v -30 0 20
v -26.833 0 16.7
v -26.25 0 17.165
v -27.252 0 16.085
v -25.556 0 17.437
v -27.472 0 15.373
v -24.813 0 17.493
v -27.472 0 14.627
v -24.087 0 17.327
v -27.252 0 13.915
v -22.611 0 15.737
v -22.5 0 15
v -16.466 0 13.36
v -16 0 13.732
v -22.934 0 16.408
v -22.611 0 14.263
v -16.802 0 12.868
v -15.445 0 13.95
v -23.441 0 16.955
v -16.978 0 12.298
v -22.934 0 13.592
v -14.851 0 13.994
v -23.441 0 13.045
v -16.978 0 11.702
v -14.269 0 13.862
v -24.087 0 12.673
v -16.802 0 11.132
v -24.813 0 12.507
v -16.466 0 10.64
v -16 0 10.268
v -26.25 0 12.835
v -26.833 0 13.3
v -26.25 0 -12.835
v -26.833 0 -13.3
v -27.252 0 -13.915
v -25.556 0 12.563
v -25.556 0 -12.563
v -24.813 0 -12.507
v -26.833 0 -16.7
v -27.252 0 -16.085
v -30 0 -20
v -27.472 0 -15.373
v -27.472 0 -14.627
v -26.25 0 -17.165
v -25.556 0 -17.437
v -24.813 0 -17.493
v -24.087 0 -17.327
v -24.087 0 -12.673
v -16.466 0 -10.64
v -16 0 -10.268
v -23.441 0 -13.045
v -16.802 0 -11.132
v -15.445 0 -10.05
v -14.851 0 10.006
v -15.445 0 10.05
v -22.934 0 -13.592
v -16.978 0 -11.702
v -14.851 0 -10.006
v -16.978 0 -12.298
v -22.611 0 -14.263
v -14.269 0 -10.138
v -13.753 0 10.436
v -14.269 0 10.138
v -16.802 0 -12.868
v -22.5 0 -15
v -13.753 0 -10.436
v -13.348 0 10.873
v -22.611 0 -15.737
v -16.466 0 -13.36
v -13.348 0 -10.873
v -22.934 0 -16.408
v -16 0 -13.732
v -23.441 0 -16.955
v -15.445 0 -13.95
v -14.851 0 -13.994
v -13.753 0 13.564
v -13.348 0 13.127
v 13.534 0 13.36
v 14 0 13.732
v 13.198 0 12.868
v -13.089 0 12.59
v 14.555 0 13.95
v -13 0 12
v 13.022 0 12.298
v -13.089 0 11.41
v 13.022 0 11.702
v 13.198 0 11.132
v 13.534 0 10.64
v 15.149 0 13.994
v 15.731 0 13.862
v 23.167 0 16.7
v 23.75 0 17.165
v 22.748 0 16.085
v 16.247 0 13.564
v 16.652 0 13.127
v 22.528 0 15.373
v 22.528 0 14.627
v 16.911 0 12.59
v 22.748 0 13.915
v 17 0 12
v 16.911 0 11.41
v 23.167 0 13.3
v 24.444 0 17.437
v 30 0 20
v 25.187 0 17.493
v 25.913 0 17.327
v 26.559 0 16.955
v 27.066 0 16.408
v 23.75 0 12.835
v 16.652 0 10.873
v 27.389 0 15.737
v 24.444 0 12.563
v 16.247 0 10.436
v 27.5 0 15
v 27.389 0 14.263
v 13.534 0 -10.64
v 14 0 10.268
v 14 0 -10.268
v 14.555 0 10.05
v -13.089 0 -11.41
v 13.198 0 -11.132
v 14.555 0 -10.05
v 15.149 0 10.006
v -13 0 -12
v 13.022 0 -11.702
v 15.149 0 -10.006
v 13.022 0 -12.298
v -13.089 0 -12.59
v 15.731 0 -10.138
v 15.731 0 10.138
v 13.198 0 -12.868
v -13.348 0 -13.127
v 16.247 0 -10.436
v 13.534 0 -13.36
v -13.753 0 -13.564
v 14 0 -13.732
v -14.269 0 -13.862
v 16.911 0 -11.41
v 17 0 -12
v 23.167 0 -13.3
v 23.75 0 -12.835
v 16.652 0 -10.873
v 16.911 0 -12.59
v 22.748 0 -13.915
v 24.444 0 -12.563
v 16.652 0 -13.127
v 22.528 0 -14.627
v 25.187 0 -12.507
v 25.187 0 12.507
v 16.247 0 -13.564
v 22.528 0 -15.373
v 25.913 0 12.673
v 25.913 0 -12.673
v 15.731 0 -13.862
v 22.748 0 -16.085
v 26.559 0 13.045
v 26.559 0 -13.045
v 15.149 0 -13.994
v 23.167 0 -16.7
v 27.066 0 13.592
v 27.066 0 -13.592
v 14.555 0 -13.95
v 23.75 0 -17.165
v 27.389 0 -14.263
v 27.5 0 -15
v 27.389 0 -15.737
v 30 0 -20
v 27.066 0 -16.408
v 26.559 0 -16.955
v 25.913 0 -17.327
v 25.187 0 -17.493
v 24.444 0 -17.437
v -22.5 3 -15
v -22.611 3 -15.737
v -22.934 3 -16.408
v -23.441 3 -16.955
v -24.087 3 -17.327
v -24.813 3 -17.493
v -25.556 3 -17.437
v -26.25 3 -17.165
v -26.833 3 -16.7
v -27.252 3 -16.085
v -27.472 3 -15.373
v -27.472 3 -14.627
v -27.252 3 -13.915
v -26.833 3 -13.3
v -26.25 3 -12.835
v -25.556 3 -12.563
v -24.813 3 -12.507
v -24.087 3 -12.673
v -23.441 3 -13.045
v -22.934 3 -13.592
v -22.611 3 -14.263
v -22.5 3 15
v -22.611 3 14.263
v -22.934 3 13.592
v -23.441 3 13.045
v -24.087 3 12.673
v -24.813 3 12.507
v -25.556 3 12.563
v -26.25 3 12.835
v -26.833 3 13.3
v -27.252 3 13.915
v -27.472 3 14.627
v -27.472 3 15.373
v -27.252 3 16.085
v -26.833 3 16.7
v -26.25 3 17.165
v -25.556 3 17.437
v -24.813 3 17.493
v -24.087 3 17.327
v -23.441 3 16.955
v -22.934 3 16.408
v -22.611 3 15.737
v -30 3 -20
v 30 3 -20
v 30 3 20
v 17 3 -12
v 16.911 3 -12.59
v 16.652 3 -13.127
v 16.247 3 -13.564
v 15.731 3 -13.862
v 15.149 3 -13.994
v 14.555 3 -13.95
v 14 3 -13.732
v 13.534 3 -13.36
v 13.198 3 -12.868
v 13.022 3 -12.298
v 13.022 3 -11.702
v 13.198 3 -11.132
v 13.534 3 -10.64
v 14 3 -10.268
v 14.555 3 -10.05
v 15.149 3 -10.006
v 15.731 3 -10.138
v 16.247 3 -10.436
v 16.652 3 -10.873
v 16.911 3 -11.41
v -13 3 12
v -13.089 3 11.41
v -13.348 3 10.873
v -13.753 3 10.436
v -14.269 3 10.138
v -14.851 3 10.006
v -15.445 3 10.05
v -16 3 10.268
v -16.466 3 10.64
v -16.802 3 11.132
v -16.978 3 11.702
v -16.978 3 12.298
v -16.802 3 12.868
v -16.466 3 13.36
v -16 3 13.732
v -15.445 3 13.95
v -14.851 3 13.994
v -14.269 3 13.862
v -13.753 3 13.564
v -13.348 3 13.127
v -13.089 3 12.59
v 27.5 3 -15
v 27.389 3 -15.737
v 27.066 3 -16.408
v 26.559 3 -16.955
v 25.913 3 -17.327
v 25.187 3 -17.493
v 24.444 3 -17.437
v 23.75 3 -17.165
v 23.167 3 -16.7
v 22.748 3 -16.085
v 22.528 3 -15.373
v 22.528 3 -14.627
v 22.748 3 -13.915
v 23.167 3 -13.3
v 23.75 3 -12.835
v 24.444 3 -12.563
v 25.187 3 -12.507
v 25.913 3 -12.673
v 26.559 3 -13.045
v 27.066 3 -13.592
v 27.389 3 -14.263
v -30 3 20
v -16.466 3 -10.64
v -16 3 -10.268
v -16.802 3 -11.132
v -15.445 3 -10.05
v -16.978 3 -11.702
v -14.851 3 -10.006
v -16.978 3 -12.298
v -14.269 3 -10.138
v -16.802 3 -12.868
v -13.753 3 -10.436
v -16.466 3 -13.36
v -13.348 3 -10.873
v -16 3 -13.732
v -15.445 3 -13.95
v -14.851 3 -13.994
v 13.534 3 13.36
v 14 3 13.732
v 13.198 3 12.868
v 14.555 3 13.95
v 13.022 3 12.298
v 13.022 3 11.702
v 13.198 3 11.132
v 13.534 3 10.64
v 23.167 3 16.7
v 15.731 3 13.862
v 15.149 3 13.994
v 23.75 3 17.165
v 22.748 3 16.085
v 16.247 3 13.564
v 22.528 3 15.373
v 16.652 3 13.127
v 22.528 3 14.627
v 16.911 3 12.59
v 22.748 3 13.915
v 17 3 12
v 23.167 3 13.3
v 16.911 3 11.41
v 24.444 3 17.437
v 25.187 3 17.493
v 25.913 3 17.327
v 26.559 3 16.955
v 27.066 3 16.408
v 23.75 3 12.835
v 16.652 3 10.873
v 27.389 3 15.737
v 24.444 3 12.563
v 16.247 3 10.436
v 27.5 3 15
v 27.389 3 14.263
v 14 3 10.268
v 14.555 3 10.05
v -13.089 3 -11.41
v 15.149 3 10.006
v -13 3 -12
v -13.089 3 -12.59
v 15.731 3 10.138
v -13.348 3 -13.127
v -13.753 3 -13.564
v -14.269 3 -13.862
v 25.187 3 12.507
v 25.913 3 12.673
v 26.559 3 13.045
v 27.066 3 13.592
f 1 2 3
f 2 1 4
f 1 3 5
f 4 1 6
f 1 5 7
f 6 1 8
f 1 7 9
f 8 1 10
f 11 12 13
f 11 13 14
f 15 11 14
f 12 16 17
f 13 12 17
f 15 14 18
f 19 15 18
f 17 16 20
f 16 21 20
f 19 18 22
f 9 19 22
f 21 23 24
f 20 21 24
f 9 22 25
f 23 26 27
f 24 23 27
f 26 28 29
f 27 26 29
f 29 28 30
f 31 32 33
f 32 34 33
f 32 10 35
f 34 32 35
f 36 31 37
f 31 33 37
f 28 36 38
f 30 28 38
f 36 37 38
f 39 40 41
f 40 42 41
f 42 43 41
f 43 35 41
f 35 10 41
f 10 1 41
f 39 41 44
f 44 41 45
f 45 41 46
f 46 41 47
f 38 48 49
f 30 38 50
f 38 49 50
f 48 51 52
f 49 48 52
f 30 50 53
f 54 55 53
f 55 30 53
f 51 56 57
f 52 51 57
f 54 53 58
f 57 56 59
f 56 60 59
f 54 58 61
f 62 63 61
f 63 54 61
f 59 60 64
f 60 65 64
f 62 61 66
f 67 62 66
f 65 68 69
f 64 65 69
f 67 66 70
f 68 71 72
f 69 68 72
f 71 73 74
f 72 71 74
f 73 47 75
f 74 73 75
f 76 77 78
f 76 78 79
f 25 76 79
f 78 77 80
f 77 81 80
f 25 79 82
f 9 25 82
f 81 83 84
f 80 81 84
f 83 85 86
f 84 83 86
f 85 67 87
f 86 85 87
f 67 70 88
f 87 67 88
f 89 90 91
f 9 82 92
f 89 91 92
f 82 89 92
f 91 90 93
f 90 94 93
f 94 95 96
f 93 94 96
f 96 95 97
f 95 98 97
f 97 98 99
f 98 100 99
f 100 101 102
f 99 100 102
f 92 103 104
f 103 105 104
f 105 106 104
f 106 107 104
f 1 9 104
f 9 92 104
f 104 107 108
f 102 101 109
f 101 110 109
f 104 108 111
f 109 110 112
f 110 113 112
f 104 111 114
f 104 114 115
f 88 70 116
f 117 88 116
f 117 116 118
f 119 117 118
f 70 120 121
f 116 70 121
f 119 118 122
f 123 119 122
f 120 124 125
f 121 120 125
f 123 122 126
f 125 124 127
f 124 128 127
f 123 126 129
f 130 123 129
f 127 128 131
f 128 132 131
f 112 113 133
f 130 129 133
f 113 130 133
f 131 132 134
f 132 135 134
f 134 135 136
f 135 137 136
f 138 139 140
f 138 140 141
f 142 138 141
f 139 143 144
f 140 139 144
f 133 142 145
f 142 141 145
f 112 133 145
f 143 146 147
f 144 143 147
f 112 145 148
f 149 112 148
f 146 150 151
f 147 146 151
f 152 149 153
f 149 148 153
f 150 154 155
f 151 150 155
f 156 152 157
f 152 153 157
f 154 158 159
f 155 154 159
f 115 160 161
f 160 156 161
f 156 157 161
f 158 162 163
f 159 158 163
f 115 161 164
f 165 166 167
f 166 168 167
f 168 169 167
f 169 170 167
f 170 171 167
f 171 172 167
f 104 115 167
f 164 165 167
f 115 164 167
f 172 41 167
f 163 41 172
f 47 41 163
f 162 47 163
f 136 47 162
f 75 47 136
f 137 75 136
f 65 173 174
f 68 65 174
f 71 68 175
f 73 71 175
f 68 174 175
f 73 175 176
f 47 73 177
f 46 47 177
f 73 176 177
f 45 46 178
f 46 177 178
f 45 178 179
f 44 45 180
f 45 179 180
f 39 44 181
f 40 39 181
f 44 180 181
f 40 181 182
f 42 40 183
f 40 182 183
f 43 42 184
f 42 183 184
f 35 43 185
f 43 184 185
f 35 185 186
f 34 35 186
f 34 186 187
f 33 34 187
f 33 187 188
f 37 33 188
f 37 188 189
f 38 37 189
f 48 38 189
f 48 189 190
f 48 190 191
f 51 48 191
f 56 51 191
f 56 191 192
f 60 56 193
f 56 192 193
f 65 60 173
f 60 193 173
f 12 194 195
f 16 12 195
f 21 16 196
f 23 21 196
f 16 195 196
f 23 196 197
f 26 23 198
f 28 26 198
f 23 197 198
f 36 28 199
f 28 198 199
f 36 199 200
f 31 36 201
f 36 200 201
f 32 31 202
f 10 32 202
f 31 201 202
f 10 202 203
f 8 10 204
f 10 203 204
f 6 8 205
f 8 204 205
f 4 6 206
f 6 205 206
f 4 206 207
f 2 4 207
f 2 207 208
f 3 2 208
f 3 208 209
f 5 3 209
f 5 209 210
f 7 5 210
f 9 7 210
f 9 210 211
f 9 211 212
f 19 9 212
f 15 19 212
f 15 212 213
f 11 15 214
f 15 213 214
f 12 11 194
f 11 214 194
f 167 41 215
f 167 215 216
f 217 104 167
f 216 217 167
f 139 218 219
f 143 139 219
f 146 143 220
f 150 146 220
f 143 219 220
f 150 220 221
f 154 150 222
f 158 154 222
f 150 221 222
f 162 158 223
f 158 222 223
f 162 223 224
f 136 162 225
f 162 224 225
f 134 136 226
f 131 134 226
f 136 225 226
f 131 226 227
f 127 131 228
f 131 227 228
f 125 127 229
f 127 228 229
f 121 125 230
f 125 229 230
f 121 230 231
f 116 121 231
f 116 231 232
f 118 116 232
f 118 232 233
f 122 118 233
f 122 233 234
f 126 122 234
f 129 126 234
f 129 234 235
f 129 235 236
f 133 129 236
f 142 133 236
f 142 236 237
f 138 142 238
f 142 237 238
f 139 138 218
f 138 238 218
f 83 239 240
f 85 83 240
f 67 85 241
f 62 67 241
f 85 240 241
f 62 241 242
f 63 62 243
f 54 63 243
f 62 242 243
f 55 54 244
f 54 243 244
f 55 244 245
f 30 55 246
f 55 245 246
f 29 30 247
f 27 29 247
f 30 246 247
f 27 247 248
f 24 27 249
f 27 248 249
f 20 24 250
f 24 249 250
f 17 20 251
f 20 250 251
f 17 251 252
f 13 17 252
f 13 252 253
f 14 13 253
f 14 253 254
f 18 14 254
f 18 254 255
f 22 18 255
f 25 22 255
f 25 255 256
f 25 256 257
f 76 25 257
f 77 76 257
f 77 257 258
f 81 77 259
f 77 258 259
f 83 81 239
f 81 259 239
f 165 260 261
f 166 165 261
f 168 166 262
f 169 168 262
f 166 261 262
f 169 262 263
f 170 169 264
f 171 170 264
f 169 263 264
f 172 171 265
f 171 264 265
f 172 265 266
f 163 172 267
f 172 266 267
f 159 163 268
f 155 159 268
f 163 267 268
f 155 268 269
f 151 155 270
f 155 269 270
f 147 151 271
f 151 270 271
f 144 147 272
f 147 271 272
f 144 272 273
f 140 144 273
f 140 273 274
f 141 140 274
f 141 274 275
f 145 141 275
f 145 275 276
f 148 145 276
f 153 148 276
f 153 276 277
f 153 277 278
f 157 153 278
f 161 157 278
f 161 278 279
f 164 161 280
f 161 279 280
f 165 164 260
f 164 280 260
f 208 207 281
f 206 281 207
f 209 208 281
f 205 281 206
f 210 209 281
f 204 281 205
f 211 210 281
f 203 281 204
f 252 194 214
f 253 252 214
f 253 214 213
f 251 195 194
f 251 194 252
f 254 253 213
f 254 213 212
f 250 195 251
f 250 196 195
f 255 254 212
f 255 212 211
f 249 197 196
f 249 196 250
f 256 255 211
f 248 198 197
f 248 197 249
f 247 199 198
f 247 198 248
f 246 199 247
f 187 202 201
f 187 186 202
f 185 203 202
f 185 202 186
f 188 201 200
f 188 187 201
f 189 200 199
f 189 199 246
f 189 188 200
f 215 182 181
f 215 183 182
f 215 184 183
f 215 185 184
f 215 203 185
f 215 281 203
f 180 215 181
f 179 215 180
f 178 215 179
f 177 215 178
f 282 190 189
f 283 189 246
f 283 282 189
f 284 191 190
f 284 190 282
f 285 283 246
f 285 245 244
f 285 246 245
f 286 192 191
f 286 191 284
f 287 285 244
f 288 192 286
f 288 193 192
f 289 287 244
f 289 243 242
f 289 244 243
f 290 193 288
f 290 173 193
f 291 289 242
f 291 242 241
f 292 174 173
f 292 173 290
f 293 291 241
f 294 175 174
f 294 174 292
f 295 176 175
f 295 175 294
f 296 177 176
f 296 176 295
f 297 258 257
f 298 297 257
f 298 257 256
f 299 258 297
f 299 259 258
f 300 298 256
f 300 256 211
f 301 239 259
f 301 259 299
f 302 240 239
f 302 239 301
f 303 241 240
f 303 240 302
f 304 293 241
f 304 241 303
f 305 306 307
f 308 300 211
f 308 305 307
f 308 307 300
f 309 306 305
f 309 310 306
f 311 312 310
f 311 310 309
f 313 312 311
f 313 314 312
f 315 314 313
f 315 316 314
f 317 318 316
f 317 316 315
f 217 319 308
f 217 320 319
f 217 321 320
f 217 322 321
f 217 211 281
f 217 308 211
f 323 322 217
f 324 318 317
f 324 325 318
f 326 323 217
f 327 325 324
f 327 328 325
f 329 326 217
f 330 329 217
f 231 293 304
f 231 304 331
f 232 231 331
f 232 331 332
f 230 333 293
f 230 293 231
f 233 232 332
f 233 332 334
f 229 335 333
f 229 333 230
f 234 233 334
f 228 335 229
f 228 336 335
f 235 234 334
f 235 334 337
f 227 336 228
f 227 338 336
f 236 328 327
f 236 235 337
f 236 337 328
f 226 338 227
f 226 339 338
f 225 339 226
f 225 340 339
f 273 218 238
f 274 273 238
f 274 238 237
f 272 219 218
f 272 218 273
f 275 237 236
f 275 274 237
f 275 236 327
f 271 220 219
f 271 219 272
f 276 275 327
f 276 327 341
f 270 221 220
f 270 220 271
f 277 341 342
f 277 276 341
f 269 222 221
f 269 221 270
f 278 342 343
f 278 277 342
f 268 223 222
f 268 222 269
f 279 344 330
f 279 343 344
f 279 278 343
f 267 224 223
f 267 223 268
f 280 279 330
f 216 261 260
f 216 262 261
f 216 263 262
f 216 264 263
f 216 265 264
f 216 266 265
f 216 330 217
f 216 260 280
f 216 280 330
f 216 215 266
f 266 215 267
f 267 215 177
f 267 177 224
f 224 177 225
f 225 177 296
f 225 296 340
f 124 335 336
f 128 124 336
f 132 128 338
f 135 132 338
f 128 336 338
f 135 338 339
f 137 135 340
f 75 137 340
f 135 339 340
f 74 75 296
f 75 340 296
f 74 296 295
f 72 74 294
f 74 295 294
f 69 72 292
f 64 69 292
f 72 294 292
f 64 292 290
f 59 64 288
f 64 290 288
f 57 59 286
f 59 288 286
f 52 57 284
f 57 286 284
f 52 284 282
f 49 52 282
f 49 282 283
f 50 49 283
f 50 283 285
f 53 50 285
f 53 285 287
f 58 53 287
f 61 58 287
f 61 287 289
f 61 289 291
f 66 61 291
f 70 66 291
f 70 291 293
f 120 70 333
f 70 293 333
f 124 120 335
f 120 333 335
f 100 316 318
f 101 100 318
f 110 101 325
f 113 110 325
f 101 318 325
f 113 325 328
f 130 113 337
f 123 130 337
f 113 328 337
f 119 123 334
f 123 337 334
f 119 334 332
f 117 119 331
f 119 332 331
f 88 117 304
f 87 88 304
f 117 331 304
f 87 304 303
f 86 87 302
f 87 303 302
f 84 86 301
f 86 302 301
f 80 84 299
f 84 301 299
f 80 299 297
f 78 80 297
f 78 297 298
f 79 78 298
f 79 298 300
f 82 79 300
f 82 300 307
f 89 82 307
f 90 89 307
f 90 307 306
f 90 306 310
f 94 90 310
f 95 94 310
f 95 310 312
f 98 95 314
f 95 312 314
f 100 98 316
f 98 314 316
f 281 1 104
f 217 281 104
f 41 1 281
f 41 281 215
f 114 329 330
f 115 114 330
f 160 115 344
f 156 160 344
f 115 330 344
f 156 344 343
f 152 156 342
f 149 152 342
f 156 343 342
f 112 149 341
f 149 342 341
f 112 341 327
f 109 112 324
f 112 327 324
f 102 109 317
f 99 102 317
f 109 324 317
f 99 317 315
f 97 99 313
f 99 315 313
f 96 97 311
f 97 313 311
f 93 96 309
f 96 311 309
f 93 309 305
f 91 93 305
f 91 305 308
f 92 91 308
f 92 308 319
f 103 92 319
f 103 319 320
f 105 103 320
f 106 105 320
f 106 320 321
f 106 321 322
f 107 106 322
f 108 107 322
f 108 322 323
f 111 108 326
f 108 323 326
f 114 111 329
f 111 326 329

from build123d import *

# Parameters (mm, degrees)
SKETCH1_W           = 60
SKETCH1_H           = 40
BOSS_EXTRUDE1_DEPTH = 3
SKETCH2_R           = 2
CUT_EXTRUDE1_DEPTH  = 3
SKETCH3_R           = 2.5
CUT_EXTRUDE2_DEPTH  = 3


with BuildPart() as part:
    # Sketch1 → Boss-Extrude1 (new body)
    with BuildSketch(Plane(origin=(0, 0, 0), x_dir=(1, 0, 0), z_dir=(0, 1, 0))):
        Rectangle(SKETCH1_W, SKETCH1_H)
    extrude(amount=BOSS_EXTRUDE1_DEPTH)

    # Sketch2 → Cut-Extrude1 (cut)
    with BuildSketch(Plane(origin=(0, 3, 0), x_dir=(1, 0, 0), z_dir=(0, 1, 0))):
        with Locations((-15, 12)):
            Circle(SKETCH2_R)
        with Locations((15, 12)):
            Circle(SKETCH2_R)
        with Locations((15, -12)):
            Circle(SKETCH2_R)
        with Locations((-15, -12)):
            Circle(SKETCH2_R)
    extrude(amount=-CUT_EXTRUDE1_DEPTH, mode=Mode.SUBTRACT)

    # Sketch3 → Cut-Extrude2 (cut)
    with BuildSketch(Plane(origin=(0, 3, 0), x_dir=(1, 0, 0), z_dir=(0, 1, 0))):
        with Locations((-25, 15)):
            Circle(SKETCH3_R)
        with Locations((-25, -15)):
            Circle(SKETCH3_R)
        with Locations((25, 15)):
            Circle(SKETCH3_R)
        with Locations((25, -15)):
            Circle(SKETCH3_R)
    extrude(amount=-CUT_EXTRUDE2_DEPTH, mode=Mode.SUBTRACT)


solid = part.part
